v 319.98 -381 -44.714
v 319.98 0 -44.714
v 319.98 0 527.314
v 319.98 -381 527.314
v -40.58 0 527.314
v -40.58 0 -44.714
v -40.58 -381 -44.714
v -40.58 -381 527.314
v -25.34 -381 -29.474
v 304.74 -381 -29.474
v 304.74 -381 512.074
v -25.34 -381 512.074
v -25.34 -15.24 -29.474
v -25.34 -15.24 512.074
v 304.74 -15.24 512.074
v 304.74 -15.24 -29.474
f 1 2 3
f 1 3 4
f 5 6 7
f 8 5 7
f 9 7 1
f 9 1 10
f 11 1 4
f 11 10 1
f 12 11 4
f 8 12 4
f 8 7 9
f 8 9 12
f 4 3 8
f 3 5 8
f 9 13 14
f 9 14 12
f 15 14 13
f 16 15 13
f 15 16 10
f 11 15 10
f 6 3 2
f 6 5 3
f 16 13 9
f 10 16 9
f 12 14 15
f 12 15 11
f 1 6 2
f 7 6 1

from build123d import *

# Parameters (mm, degrees)
F0_W     = 81.1607763171
F0_H     = 89.4276052713
F1_DEPTH = 381
F2_DEPTH = 482.6
F3_DEPTH = 279.4
F4_T     = -15.24


with BuildPart() as f1:
    # F0 (on Front) → F1 (new body)
    with BuildSketch(Plane.XZ):
        Rectangle(F0_W, F0_H)
    extrude(amount=F1_DEPTH)

    # F2 (add): a face of the model
    f2_faces = [f1.faces().sort_by_distance(p)[0] for p in [
        (0, -190.5, 44.7138026357),
    ]]
    extrude(f2_faces, amount=F2_DEPTH)

    # F3 (add): a face of the model
    f3_faces = [f1.faces().sort_by_distance(p)[0] for p in [
        (40.5803881586, -190.5, 241.3),
    ]]
    extrude(f3_faces, amount=F3_DEPTH)

    # F4
    f4_openings = [f1.faces().sort_by_distance(p)[0] for p in [
        (139.7, -381, 241.3),
    ]]
    offset(amount=F4_T, openings=f4_openings)


solid = f1.part
